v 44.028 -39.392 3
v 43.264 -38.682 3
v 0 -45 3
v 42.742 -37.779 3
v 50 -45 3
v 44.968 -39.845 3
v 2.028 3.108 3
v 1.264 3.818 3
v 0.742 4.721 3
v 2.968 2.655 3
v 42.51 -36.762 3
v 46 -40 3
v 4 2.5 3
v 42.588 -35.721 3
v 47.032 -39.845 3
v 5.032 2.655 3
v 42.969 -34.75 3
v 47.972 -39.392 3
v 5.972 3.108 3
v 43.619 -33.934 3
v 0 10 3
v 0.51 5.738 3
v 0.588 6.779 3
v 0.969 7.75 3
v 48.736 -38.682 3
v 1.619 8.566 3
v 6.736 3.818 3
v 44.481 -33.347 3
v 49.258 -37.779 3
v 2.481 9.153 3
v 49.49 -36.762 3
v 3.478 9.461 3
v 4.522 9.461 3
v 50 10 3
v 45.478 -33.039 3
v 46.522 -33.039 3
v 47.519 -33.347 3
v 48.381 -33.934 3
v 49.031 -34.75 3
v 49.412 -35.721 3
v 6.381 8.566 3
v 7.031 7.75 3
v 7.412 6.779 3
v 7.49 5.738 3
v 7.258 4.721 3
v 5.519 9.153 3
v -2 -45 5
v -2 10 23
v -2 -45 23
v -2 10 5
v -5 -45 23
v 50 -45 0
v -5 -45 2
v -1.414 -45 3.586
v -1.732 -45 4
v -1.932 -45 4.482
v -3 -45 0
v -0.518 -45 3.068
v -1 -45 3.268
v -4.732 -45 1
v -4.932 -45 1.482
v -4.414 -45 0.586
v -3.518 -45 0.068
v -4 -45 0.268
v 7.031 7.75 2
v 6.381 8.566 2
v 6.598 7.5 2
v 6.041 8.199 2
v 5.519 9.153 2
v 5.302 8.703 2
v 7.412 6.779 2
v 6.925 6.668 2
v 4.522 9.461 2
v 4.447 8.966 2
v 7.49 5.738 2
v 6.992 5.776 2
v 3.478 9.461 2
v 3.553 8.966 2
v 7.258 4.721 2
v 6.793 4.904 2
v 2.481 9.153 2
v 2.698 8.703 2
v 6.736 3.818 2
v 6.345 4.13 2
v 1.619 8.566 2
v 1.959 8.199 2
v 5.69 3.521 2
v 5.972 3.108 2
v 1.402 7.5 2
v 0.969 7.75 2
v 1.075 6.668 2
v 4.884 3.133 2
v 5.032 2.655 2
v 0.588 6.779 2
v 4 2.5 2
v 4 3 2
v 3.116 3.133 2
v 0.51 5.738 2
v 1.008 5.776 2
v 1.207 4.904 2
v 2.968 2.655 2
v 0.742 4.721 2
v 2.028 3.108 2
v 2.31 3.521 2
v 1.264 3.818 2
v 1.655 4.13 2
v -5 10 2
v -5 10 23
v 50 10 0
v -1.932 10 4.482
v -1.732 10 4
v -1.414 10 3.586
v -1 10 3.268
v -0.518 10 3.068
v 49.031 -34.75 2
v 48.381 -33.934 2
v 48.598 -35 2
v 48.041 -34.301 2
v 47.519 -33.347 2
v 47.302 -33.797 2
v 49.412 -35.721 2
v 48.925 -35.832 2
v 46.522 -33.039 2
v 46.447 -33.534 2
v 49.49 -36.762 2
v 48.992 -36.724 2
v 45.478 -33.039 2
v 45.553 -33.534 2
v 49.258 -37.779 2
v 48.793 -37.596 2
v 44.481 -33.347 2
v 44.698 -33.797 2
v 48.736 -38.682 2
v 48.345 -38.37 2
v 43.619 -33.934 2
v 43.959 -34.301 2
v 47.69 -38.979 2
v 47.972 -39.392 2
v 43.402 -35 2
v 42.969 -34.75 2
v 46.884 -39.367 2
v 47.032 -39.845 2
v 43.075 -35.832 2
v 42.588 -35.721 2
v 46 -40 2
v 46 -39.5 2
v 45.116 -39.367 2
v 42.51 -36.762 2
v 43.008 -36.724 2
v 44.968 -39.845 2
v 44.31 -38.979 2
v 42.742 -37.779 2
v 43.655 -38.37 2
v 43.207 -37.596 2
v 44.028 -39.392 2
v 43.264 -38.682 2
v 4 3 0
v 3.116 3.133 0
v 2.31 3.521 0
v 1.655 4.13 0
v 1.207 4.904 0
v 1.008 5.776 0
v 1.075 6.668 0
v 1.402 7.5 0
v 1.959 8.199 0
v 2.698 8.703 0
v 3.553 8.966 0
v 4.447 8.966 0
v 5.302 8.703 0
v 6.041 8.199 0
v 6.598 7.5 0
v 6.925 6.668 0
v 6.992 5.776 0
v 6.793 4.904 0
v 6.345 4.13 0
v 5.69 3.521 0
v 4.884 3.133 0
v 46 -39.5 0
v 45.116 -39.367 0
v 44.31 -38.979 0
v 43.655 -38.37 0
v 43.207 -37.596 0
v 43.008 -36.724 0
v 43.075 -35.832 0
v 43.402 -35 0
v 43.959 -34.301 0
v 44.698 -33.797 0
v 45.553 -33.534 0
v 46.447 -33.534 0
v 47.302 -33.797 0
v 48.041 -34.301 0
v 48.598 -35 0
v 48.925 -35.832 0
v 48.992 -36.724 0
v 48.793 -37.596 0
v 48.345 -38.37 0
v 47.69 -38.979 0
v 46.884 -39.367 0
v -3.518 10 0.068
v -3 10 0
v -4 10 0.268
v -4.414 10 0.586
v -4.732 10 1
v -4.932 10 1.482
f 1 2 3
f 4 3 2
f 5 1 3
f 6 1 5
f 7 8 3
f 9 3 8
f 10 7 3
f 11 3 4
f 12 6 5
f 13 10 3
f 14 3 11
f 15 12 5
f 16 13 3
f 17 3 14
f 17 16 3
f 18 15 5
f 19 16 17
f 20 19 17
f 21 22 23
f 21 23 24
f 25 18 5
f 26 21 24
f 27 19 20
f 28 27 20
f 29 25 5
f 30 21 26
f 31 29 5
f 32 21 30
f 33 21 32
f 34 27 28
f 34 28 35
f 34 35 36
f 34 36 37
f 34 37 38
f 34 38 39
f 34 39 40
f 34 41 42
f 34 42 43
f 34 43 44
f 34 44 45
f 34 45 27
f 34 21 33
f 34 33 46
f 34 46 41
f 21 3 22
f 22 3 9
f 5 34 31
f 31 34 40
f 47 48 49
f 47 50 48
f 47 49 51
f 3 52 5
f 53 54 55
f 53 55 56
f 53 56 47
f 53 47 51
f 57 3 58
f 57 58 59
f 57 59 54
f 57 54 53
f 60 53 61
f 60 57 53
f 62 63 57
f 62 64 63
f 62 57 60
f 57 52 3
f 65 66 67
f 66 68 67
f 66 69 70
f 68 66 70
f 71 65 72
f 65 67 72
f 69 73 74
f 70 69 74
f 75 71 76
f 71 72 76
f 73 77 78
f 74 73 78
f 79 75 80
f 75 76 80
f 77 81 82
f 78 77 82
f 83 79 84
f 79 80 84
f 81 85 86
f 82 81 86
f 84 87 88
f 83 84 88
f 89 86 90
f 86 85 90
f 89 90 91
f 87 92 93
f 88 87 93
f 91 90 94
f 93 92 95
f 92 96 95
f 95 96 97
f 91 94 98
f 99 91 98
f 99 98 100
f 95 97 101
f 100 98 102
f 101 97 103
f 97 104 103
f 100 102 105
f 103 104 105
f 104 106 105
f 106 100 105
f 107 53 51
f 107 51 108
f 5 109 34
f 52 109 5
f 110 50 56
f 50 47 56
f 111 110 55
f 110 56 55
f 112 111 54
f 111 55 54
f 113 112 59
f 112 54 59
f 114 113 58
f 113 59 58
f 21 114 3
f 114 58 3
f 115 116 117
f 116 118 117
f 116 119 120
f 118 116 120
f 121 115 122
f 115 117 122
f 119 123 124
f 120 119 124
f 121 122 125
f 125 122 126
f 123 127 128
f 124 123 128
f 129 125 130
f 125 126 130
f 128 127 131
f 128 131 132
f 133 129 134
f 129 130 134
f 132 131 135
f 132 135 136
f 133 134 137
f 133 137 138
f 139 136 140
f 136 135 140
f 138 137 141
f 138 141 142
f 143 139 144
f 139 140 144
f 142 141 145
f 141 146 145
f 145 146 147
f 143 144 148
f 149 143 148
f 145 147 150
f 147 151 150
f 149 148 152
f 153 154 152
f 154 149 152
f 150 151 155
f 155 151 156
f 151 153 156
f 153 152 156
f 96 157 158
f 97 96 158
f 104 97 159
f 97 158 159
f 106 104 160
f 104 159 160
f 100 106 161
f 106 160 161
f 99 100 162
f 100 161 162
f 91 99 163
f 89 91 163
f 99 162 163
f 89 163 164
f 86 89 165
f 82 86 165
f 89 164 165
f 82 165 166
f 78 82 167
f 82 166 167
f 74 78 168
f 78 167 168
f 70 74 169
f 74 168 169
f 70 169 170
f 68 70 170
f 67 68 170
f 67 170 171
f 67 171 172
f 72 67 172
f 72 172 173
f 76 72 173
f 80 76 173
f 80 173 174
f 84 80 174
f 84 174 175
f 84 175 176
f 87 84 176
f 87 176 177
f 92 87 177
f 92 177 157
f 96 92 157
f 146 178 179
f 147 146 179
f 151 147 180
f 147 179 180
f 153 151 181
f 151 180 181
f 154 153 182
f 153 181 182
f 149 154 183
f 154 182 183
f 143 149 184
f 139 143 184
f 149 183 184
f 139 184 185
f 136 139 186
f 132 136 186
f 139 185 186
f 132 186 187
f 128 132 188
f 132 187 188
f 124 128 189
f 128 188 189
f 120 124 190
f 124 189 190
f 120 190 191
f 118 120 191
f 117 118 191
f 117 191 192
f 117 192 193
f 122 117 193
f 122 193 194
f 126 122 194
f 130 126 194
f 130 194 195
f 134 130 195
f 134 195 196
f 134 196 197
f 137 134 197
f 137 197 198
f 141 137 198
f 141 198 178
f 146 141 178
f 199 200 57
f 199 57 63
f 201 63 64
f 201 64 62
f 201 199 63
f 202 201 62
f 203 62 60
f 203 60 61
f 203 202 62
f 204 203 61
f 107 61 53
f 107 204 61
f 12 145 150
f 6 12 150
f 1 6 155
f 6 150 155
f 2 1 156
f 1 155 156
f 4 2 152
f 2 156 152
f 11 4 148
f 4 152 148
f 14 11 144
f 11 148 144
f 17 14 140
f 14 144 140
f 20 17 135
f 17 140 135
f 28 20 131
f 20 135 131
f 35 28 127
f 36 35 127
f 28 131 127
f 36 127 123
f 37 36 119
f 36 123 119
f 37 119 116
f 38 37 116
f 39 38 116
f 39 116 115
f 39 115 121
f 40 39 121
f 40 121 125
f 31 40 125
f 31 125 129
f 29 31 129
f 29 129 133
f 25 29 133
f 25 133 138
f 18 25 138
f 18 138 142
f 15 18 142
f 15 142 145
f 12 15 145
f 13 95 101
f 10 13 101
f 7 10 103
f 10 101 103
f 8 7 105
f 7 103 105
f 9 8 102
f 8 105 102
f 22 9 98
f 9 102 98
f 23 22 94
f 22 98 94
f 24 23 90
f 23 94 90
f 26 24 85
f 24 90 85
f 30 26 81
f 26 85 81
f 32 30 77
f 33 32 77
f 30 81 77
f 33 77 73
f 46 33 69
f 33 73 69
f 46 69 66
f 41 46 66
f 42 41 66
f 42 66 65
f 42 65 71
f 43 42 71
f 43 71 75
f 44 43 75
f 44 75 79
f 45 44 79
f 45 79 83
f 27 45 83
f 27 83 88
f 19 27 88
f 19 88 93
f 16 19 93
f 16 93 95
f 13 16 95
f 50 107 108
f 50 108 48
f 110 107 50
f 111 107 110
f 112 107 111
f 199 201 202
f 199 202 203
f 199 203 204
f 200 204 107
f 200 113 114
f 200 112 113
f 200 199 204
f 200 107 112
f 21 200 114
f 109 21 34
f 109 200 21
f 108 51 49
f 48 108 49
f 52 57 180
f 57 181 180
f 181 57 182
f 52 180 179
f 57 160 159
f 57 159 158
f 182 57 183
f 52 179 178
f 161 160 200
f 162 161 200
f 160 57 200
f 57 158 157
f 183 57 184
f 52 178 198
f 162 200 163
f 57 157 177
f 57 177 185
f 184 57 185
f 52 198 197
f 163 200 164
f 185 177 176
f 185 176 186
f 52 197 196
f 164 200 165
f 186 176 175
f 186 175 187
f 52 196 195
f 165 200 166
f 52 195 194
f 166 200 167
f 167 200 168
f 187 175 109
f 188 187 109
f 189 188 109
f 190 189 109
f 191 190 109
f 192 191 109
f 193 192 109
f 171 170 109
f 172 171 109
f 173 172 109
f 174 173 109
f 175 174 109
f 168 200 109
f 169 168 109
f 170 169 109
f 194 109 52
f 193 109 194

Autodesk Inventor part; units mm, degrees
ref_plane "YZ Plane" through (0, 0, 0) normal (1, 0, 0) x (0, 1, 0)
ref_plane "XZ Plane" through (0, 0, 0) normal (0, 1, 0) x (-1, 0, 0)
ref_plane "XY Plane" through (0, 0, 0) normal (0, 0, 1) x (1, 0, 0)
sketch "Skizze1" plane through (0, 0, 0) normal (0, 0, 1) x (1, 0, 0)
  line L0 (0, 10) -> (50, 10)
  line L1 (50, 10) -> (50, -45)
  line L2 (50, -45) -> (0, -45)
  line L3 (0, -45) -> (-5, -45)
  line L4 (-5, -45) -> (-5, 10)
  line L5 (-5, 10) -> (0, 10)
  point P0 (0, 0)
  dimension "d0" = 10
  dimension "d1" = 50
  dimension "d2" = 55
  dimension "d3" = 50
  dimension "d6" = 5
extrude "Extrusion1" add sketch "Skizze1" along normal blind 3
sketch "Skizze3" plane through (0, 0, 3) normal (0, 0, 1) x (1, 0, 0)
  line L0 (50, 10) -> (-5, 10) projected
  line L1 (-5, 10) -> (-5, -45) projected
  line L2 (-5, 10) -> (-2, 10)
  line L3 (-2, 10) -> (-2, -45)
  line L4 (-5, -45) -> (50, -45) projected
  line L5 (-5, -45) -> (-5, 10)
  point P0 (0, 0)
  dimension "d13" = 3
extrude "Extrusion3" add sketch "Skizze3" along normal blind 20
fillet "Rundung2" radius 2 2 edges at (-2, -17.5, 3) (-5, -17.5, 0)
sketch "Skizze4" plane through (0, 0, 3) normal (0, 0, 1) x (1, 0, 0)
  circle A0 centre (46, -36.5) radius 3 projected
  circle A1 centre (4, 6) radius 3 projected
  circle A2 centre (4, 6) radius 1.8 projected
  circle A3 centre (46, -36.5) radius 1.8 projected
  point P0 (0, 0)
  dimension "d17" = 3.6
  dimension "d18" = 6
hole "Bohrung1" at (4, 6, 3) at (46, -36.5, 3) direction (0, 0, -1) diameter 6 end through all counterbore diameter 7 counterbore depth 1
properties part number "stativ"
